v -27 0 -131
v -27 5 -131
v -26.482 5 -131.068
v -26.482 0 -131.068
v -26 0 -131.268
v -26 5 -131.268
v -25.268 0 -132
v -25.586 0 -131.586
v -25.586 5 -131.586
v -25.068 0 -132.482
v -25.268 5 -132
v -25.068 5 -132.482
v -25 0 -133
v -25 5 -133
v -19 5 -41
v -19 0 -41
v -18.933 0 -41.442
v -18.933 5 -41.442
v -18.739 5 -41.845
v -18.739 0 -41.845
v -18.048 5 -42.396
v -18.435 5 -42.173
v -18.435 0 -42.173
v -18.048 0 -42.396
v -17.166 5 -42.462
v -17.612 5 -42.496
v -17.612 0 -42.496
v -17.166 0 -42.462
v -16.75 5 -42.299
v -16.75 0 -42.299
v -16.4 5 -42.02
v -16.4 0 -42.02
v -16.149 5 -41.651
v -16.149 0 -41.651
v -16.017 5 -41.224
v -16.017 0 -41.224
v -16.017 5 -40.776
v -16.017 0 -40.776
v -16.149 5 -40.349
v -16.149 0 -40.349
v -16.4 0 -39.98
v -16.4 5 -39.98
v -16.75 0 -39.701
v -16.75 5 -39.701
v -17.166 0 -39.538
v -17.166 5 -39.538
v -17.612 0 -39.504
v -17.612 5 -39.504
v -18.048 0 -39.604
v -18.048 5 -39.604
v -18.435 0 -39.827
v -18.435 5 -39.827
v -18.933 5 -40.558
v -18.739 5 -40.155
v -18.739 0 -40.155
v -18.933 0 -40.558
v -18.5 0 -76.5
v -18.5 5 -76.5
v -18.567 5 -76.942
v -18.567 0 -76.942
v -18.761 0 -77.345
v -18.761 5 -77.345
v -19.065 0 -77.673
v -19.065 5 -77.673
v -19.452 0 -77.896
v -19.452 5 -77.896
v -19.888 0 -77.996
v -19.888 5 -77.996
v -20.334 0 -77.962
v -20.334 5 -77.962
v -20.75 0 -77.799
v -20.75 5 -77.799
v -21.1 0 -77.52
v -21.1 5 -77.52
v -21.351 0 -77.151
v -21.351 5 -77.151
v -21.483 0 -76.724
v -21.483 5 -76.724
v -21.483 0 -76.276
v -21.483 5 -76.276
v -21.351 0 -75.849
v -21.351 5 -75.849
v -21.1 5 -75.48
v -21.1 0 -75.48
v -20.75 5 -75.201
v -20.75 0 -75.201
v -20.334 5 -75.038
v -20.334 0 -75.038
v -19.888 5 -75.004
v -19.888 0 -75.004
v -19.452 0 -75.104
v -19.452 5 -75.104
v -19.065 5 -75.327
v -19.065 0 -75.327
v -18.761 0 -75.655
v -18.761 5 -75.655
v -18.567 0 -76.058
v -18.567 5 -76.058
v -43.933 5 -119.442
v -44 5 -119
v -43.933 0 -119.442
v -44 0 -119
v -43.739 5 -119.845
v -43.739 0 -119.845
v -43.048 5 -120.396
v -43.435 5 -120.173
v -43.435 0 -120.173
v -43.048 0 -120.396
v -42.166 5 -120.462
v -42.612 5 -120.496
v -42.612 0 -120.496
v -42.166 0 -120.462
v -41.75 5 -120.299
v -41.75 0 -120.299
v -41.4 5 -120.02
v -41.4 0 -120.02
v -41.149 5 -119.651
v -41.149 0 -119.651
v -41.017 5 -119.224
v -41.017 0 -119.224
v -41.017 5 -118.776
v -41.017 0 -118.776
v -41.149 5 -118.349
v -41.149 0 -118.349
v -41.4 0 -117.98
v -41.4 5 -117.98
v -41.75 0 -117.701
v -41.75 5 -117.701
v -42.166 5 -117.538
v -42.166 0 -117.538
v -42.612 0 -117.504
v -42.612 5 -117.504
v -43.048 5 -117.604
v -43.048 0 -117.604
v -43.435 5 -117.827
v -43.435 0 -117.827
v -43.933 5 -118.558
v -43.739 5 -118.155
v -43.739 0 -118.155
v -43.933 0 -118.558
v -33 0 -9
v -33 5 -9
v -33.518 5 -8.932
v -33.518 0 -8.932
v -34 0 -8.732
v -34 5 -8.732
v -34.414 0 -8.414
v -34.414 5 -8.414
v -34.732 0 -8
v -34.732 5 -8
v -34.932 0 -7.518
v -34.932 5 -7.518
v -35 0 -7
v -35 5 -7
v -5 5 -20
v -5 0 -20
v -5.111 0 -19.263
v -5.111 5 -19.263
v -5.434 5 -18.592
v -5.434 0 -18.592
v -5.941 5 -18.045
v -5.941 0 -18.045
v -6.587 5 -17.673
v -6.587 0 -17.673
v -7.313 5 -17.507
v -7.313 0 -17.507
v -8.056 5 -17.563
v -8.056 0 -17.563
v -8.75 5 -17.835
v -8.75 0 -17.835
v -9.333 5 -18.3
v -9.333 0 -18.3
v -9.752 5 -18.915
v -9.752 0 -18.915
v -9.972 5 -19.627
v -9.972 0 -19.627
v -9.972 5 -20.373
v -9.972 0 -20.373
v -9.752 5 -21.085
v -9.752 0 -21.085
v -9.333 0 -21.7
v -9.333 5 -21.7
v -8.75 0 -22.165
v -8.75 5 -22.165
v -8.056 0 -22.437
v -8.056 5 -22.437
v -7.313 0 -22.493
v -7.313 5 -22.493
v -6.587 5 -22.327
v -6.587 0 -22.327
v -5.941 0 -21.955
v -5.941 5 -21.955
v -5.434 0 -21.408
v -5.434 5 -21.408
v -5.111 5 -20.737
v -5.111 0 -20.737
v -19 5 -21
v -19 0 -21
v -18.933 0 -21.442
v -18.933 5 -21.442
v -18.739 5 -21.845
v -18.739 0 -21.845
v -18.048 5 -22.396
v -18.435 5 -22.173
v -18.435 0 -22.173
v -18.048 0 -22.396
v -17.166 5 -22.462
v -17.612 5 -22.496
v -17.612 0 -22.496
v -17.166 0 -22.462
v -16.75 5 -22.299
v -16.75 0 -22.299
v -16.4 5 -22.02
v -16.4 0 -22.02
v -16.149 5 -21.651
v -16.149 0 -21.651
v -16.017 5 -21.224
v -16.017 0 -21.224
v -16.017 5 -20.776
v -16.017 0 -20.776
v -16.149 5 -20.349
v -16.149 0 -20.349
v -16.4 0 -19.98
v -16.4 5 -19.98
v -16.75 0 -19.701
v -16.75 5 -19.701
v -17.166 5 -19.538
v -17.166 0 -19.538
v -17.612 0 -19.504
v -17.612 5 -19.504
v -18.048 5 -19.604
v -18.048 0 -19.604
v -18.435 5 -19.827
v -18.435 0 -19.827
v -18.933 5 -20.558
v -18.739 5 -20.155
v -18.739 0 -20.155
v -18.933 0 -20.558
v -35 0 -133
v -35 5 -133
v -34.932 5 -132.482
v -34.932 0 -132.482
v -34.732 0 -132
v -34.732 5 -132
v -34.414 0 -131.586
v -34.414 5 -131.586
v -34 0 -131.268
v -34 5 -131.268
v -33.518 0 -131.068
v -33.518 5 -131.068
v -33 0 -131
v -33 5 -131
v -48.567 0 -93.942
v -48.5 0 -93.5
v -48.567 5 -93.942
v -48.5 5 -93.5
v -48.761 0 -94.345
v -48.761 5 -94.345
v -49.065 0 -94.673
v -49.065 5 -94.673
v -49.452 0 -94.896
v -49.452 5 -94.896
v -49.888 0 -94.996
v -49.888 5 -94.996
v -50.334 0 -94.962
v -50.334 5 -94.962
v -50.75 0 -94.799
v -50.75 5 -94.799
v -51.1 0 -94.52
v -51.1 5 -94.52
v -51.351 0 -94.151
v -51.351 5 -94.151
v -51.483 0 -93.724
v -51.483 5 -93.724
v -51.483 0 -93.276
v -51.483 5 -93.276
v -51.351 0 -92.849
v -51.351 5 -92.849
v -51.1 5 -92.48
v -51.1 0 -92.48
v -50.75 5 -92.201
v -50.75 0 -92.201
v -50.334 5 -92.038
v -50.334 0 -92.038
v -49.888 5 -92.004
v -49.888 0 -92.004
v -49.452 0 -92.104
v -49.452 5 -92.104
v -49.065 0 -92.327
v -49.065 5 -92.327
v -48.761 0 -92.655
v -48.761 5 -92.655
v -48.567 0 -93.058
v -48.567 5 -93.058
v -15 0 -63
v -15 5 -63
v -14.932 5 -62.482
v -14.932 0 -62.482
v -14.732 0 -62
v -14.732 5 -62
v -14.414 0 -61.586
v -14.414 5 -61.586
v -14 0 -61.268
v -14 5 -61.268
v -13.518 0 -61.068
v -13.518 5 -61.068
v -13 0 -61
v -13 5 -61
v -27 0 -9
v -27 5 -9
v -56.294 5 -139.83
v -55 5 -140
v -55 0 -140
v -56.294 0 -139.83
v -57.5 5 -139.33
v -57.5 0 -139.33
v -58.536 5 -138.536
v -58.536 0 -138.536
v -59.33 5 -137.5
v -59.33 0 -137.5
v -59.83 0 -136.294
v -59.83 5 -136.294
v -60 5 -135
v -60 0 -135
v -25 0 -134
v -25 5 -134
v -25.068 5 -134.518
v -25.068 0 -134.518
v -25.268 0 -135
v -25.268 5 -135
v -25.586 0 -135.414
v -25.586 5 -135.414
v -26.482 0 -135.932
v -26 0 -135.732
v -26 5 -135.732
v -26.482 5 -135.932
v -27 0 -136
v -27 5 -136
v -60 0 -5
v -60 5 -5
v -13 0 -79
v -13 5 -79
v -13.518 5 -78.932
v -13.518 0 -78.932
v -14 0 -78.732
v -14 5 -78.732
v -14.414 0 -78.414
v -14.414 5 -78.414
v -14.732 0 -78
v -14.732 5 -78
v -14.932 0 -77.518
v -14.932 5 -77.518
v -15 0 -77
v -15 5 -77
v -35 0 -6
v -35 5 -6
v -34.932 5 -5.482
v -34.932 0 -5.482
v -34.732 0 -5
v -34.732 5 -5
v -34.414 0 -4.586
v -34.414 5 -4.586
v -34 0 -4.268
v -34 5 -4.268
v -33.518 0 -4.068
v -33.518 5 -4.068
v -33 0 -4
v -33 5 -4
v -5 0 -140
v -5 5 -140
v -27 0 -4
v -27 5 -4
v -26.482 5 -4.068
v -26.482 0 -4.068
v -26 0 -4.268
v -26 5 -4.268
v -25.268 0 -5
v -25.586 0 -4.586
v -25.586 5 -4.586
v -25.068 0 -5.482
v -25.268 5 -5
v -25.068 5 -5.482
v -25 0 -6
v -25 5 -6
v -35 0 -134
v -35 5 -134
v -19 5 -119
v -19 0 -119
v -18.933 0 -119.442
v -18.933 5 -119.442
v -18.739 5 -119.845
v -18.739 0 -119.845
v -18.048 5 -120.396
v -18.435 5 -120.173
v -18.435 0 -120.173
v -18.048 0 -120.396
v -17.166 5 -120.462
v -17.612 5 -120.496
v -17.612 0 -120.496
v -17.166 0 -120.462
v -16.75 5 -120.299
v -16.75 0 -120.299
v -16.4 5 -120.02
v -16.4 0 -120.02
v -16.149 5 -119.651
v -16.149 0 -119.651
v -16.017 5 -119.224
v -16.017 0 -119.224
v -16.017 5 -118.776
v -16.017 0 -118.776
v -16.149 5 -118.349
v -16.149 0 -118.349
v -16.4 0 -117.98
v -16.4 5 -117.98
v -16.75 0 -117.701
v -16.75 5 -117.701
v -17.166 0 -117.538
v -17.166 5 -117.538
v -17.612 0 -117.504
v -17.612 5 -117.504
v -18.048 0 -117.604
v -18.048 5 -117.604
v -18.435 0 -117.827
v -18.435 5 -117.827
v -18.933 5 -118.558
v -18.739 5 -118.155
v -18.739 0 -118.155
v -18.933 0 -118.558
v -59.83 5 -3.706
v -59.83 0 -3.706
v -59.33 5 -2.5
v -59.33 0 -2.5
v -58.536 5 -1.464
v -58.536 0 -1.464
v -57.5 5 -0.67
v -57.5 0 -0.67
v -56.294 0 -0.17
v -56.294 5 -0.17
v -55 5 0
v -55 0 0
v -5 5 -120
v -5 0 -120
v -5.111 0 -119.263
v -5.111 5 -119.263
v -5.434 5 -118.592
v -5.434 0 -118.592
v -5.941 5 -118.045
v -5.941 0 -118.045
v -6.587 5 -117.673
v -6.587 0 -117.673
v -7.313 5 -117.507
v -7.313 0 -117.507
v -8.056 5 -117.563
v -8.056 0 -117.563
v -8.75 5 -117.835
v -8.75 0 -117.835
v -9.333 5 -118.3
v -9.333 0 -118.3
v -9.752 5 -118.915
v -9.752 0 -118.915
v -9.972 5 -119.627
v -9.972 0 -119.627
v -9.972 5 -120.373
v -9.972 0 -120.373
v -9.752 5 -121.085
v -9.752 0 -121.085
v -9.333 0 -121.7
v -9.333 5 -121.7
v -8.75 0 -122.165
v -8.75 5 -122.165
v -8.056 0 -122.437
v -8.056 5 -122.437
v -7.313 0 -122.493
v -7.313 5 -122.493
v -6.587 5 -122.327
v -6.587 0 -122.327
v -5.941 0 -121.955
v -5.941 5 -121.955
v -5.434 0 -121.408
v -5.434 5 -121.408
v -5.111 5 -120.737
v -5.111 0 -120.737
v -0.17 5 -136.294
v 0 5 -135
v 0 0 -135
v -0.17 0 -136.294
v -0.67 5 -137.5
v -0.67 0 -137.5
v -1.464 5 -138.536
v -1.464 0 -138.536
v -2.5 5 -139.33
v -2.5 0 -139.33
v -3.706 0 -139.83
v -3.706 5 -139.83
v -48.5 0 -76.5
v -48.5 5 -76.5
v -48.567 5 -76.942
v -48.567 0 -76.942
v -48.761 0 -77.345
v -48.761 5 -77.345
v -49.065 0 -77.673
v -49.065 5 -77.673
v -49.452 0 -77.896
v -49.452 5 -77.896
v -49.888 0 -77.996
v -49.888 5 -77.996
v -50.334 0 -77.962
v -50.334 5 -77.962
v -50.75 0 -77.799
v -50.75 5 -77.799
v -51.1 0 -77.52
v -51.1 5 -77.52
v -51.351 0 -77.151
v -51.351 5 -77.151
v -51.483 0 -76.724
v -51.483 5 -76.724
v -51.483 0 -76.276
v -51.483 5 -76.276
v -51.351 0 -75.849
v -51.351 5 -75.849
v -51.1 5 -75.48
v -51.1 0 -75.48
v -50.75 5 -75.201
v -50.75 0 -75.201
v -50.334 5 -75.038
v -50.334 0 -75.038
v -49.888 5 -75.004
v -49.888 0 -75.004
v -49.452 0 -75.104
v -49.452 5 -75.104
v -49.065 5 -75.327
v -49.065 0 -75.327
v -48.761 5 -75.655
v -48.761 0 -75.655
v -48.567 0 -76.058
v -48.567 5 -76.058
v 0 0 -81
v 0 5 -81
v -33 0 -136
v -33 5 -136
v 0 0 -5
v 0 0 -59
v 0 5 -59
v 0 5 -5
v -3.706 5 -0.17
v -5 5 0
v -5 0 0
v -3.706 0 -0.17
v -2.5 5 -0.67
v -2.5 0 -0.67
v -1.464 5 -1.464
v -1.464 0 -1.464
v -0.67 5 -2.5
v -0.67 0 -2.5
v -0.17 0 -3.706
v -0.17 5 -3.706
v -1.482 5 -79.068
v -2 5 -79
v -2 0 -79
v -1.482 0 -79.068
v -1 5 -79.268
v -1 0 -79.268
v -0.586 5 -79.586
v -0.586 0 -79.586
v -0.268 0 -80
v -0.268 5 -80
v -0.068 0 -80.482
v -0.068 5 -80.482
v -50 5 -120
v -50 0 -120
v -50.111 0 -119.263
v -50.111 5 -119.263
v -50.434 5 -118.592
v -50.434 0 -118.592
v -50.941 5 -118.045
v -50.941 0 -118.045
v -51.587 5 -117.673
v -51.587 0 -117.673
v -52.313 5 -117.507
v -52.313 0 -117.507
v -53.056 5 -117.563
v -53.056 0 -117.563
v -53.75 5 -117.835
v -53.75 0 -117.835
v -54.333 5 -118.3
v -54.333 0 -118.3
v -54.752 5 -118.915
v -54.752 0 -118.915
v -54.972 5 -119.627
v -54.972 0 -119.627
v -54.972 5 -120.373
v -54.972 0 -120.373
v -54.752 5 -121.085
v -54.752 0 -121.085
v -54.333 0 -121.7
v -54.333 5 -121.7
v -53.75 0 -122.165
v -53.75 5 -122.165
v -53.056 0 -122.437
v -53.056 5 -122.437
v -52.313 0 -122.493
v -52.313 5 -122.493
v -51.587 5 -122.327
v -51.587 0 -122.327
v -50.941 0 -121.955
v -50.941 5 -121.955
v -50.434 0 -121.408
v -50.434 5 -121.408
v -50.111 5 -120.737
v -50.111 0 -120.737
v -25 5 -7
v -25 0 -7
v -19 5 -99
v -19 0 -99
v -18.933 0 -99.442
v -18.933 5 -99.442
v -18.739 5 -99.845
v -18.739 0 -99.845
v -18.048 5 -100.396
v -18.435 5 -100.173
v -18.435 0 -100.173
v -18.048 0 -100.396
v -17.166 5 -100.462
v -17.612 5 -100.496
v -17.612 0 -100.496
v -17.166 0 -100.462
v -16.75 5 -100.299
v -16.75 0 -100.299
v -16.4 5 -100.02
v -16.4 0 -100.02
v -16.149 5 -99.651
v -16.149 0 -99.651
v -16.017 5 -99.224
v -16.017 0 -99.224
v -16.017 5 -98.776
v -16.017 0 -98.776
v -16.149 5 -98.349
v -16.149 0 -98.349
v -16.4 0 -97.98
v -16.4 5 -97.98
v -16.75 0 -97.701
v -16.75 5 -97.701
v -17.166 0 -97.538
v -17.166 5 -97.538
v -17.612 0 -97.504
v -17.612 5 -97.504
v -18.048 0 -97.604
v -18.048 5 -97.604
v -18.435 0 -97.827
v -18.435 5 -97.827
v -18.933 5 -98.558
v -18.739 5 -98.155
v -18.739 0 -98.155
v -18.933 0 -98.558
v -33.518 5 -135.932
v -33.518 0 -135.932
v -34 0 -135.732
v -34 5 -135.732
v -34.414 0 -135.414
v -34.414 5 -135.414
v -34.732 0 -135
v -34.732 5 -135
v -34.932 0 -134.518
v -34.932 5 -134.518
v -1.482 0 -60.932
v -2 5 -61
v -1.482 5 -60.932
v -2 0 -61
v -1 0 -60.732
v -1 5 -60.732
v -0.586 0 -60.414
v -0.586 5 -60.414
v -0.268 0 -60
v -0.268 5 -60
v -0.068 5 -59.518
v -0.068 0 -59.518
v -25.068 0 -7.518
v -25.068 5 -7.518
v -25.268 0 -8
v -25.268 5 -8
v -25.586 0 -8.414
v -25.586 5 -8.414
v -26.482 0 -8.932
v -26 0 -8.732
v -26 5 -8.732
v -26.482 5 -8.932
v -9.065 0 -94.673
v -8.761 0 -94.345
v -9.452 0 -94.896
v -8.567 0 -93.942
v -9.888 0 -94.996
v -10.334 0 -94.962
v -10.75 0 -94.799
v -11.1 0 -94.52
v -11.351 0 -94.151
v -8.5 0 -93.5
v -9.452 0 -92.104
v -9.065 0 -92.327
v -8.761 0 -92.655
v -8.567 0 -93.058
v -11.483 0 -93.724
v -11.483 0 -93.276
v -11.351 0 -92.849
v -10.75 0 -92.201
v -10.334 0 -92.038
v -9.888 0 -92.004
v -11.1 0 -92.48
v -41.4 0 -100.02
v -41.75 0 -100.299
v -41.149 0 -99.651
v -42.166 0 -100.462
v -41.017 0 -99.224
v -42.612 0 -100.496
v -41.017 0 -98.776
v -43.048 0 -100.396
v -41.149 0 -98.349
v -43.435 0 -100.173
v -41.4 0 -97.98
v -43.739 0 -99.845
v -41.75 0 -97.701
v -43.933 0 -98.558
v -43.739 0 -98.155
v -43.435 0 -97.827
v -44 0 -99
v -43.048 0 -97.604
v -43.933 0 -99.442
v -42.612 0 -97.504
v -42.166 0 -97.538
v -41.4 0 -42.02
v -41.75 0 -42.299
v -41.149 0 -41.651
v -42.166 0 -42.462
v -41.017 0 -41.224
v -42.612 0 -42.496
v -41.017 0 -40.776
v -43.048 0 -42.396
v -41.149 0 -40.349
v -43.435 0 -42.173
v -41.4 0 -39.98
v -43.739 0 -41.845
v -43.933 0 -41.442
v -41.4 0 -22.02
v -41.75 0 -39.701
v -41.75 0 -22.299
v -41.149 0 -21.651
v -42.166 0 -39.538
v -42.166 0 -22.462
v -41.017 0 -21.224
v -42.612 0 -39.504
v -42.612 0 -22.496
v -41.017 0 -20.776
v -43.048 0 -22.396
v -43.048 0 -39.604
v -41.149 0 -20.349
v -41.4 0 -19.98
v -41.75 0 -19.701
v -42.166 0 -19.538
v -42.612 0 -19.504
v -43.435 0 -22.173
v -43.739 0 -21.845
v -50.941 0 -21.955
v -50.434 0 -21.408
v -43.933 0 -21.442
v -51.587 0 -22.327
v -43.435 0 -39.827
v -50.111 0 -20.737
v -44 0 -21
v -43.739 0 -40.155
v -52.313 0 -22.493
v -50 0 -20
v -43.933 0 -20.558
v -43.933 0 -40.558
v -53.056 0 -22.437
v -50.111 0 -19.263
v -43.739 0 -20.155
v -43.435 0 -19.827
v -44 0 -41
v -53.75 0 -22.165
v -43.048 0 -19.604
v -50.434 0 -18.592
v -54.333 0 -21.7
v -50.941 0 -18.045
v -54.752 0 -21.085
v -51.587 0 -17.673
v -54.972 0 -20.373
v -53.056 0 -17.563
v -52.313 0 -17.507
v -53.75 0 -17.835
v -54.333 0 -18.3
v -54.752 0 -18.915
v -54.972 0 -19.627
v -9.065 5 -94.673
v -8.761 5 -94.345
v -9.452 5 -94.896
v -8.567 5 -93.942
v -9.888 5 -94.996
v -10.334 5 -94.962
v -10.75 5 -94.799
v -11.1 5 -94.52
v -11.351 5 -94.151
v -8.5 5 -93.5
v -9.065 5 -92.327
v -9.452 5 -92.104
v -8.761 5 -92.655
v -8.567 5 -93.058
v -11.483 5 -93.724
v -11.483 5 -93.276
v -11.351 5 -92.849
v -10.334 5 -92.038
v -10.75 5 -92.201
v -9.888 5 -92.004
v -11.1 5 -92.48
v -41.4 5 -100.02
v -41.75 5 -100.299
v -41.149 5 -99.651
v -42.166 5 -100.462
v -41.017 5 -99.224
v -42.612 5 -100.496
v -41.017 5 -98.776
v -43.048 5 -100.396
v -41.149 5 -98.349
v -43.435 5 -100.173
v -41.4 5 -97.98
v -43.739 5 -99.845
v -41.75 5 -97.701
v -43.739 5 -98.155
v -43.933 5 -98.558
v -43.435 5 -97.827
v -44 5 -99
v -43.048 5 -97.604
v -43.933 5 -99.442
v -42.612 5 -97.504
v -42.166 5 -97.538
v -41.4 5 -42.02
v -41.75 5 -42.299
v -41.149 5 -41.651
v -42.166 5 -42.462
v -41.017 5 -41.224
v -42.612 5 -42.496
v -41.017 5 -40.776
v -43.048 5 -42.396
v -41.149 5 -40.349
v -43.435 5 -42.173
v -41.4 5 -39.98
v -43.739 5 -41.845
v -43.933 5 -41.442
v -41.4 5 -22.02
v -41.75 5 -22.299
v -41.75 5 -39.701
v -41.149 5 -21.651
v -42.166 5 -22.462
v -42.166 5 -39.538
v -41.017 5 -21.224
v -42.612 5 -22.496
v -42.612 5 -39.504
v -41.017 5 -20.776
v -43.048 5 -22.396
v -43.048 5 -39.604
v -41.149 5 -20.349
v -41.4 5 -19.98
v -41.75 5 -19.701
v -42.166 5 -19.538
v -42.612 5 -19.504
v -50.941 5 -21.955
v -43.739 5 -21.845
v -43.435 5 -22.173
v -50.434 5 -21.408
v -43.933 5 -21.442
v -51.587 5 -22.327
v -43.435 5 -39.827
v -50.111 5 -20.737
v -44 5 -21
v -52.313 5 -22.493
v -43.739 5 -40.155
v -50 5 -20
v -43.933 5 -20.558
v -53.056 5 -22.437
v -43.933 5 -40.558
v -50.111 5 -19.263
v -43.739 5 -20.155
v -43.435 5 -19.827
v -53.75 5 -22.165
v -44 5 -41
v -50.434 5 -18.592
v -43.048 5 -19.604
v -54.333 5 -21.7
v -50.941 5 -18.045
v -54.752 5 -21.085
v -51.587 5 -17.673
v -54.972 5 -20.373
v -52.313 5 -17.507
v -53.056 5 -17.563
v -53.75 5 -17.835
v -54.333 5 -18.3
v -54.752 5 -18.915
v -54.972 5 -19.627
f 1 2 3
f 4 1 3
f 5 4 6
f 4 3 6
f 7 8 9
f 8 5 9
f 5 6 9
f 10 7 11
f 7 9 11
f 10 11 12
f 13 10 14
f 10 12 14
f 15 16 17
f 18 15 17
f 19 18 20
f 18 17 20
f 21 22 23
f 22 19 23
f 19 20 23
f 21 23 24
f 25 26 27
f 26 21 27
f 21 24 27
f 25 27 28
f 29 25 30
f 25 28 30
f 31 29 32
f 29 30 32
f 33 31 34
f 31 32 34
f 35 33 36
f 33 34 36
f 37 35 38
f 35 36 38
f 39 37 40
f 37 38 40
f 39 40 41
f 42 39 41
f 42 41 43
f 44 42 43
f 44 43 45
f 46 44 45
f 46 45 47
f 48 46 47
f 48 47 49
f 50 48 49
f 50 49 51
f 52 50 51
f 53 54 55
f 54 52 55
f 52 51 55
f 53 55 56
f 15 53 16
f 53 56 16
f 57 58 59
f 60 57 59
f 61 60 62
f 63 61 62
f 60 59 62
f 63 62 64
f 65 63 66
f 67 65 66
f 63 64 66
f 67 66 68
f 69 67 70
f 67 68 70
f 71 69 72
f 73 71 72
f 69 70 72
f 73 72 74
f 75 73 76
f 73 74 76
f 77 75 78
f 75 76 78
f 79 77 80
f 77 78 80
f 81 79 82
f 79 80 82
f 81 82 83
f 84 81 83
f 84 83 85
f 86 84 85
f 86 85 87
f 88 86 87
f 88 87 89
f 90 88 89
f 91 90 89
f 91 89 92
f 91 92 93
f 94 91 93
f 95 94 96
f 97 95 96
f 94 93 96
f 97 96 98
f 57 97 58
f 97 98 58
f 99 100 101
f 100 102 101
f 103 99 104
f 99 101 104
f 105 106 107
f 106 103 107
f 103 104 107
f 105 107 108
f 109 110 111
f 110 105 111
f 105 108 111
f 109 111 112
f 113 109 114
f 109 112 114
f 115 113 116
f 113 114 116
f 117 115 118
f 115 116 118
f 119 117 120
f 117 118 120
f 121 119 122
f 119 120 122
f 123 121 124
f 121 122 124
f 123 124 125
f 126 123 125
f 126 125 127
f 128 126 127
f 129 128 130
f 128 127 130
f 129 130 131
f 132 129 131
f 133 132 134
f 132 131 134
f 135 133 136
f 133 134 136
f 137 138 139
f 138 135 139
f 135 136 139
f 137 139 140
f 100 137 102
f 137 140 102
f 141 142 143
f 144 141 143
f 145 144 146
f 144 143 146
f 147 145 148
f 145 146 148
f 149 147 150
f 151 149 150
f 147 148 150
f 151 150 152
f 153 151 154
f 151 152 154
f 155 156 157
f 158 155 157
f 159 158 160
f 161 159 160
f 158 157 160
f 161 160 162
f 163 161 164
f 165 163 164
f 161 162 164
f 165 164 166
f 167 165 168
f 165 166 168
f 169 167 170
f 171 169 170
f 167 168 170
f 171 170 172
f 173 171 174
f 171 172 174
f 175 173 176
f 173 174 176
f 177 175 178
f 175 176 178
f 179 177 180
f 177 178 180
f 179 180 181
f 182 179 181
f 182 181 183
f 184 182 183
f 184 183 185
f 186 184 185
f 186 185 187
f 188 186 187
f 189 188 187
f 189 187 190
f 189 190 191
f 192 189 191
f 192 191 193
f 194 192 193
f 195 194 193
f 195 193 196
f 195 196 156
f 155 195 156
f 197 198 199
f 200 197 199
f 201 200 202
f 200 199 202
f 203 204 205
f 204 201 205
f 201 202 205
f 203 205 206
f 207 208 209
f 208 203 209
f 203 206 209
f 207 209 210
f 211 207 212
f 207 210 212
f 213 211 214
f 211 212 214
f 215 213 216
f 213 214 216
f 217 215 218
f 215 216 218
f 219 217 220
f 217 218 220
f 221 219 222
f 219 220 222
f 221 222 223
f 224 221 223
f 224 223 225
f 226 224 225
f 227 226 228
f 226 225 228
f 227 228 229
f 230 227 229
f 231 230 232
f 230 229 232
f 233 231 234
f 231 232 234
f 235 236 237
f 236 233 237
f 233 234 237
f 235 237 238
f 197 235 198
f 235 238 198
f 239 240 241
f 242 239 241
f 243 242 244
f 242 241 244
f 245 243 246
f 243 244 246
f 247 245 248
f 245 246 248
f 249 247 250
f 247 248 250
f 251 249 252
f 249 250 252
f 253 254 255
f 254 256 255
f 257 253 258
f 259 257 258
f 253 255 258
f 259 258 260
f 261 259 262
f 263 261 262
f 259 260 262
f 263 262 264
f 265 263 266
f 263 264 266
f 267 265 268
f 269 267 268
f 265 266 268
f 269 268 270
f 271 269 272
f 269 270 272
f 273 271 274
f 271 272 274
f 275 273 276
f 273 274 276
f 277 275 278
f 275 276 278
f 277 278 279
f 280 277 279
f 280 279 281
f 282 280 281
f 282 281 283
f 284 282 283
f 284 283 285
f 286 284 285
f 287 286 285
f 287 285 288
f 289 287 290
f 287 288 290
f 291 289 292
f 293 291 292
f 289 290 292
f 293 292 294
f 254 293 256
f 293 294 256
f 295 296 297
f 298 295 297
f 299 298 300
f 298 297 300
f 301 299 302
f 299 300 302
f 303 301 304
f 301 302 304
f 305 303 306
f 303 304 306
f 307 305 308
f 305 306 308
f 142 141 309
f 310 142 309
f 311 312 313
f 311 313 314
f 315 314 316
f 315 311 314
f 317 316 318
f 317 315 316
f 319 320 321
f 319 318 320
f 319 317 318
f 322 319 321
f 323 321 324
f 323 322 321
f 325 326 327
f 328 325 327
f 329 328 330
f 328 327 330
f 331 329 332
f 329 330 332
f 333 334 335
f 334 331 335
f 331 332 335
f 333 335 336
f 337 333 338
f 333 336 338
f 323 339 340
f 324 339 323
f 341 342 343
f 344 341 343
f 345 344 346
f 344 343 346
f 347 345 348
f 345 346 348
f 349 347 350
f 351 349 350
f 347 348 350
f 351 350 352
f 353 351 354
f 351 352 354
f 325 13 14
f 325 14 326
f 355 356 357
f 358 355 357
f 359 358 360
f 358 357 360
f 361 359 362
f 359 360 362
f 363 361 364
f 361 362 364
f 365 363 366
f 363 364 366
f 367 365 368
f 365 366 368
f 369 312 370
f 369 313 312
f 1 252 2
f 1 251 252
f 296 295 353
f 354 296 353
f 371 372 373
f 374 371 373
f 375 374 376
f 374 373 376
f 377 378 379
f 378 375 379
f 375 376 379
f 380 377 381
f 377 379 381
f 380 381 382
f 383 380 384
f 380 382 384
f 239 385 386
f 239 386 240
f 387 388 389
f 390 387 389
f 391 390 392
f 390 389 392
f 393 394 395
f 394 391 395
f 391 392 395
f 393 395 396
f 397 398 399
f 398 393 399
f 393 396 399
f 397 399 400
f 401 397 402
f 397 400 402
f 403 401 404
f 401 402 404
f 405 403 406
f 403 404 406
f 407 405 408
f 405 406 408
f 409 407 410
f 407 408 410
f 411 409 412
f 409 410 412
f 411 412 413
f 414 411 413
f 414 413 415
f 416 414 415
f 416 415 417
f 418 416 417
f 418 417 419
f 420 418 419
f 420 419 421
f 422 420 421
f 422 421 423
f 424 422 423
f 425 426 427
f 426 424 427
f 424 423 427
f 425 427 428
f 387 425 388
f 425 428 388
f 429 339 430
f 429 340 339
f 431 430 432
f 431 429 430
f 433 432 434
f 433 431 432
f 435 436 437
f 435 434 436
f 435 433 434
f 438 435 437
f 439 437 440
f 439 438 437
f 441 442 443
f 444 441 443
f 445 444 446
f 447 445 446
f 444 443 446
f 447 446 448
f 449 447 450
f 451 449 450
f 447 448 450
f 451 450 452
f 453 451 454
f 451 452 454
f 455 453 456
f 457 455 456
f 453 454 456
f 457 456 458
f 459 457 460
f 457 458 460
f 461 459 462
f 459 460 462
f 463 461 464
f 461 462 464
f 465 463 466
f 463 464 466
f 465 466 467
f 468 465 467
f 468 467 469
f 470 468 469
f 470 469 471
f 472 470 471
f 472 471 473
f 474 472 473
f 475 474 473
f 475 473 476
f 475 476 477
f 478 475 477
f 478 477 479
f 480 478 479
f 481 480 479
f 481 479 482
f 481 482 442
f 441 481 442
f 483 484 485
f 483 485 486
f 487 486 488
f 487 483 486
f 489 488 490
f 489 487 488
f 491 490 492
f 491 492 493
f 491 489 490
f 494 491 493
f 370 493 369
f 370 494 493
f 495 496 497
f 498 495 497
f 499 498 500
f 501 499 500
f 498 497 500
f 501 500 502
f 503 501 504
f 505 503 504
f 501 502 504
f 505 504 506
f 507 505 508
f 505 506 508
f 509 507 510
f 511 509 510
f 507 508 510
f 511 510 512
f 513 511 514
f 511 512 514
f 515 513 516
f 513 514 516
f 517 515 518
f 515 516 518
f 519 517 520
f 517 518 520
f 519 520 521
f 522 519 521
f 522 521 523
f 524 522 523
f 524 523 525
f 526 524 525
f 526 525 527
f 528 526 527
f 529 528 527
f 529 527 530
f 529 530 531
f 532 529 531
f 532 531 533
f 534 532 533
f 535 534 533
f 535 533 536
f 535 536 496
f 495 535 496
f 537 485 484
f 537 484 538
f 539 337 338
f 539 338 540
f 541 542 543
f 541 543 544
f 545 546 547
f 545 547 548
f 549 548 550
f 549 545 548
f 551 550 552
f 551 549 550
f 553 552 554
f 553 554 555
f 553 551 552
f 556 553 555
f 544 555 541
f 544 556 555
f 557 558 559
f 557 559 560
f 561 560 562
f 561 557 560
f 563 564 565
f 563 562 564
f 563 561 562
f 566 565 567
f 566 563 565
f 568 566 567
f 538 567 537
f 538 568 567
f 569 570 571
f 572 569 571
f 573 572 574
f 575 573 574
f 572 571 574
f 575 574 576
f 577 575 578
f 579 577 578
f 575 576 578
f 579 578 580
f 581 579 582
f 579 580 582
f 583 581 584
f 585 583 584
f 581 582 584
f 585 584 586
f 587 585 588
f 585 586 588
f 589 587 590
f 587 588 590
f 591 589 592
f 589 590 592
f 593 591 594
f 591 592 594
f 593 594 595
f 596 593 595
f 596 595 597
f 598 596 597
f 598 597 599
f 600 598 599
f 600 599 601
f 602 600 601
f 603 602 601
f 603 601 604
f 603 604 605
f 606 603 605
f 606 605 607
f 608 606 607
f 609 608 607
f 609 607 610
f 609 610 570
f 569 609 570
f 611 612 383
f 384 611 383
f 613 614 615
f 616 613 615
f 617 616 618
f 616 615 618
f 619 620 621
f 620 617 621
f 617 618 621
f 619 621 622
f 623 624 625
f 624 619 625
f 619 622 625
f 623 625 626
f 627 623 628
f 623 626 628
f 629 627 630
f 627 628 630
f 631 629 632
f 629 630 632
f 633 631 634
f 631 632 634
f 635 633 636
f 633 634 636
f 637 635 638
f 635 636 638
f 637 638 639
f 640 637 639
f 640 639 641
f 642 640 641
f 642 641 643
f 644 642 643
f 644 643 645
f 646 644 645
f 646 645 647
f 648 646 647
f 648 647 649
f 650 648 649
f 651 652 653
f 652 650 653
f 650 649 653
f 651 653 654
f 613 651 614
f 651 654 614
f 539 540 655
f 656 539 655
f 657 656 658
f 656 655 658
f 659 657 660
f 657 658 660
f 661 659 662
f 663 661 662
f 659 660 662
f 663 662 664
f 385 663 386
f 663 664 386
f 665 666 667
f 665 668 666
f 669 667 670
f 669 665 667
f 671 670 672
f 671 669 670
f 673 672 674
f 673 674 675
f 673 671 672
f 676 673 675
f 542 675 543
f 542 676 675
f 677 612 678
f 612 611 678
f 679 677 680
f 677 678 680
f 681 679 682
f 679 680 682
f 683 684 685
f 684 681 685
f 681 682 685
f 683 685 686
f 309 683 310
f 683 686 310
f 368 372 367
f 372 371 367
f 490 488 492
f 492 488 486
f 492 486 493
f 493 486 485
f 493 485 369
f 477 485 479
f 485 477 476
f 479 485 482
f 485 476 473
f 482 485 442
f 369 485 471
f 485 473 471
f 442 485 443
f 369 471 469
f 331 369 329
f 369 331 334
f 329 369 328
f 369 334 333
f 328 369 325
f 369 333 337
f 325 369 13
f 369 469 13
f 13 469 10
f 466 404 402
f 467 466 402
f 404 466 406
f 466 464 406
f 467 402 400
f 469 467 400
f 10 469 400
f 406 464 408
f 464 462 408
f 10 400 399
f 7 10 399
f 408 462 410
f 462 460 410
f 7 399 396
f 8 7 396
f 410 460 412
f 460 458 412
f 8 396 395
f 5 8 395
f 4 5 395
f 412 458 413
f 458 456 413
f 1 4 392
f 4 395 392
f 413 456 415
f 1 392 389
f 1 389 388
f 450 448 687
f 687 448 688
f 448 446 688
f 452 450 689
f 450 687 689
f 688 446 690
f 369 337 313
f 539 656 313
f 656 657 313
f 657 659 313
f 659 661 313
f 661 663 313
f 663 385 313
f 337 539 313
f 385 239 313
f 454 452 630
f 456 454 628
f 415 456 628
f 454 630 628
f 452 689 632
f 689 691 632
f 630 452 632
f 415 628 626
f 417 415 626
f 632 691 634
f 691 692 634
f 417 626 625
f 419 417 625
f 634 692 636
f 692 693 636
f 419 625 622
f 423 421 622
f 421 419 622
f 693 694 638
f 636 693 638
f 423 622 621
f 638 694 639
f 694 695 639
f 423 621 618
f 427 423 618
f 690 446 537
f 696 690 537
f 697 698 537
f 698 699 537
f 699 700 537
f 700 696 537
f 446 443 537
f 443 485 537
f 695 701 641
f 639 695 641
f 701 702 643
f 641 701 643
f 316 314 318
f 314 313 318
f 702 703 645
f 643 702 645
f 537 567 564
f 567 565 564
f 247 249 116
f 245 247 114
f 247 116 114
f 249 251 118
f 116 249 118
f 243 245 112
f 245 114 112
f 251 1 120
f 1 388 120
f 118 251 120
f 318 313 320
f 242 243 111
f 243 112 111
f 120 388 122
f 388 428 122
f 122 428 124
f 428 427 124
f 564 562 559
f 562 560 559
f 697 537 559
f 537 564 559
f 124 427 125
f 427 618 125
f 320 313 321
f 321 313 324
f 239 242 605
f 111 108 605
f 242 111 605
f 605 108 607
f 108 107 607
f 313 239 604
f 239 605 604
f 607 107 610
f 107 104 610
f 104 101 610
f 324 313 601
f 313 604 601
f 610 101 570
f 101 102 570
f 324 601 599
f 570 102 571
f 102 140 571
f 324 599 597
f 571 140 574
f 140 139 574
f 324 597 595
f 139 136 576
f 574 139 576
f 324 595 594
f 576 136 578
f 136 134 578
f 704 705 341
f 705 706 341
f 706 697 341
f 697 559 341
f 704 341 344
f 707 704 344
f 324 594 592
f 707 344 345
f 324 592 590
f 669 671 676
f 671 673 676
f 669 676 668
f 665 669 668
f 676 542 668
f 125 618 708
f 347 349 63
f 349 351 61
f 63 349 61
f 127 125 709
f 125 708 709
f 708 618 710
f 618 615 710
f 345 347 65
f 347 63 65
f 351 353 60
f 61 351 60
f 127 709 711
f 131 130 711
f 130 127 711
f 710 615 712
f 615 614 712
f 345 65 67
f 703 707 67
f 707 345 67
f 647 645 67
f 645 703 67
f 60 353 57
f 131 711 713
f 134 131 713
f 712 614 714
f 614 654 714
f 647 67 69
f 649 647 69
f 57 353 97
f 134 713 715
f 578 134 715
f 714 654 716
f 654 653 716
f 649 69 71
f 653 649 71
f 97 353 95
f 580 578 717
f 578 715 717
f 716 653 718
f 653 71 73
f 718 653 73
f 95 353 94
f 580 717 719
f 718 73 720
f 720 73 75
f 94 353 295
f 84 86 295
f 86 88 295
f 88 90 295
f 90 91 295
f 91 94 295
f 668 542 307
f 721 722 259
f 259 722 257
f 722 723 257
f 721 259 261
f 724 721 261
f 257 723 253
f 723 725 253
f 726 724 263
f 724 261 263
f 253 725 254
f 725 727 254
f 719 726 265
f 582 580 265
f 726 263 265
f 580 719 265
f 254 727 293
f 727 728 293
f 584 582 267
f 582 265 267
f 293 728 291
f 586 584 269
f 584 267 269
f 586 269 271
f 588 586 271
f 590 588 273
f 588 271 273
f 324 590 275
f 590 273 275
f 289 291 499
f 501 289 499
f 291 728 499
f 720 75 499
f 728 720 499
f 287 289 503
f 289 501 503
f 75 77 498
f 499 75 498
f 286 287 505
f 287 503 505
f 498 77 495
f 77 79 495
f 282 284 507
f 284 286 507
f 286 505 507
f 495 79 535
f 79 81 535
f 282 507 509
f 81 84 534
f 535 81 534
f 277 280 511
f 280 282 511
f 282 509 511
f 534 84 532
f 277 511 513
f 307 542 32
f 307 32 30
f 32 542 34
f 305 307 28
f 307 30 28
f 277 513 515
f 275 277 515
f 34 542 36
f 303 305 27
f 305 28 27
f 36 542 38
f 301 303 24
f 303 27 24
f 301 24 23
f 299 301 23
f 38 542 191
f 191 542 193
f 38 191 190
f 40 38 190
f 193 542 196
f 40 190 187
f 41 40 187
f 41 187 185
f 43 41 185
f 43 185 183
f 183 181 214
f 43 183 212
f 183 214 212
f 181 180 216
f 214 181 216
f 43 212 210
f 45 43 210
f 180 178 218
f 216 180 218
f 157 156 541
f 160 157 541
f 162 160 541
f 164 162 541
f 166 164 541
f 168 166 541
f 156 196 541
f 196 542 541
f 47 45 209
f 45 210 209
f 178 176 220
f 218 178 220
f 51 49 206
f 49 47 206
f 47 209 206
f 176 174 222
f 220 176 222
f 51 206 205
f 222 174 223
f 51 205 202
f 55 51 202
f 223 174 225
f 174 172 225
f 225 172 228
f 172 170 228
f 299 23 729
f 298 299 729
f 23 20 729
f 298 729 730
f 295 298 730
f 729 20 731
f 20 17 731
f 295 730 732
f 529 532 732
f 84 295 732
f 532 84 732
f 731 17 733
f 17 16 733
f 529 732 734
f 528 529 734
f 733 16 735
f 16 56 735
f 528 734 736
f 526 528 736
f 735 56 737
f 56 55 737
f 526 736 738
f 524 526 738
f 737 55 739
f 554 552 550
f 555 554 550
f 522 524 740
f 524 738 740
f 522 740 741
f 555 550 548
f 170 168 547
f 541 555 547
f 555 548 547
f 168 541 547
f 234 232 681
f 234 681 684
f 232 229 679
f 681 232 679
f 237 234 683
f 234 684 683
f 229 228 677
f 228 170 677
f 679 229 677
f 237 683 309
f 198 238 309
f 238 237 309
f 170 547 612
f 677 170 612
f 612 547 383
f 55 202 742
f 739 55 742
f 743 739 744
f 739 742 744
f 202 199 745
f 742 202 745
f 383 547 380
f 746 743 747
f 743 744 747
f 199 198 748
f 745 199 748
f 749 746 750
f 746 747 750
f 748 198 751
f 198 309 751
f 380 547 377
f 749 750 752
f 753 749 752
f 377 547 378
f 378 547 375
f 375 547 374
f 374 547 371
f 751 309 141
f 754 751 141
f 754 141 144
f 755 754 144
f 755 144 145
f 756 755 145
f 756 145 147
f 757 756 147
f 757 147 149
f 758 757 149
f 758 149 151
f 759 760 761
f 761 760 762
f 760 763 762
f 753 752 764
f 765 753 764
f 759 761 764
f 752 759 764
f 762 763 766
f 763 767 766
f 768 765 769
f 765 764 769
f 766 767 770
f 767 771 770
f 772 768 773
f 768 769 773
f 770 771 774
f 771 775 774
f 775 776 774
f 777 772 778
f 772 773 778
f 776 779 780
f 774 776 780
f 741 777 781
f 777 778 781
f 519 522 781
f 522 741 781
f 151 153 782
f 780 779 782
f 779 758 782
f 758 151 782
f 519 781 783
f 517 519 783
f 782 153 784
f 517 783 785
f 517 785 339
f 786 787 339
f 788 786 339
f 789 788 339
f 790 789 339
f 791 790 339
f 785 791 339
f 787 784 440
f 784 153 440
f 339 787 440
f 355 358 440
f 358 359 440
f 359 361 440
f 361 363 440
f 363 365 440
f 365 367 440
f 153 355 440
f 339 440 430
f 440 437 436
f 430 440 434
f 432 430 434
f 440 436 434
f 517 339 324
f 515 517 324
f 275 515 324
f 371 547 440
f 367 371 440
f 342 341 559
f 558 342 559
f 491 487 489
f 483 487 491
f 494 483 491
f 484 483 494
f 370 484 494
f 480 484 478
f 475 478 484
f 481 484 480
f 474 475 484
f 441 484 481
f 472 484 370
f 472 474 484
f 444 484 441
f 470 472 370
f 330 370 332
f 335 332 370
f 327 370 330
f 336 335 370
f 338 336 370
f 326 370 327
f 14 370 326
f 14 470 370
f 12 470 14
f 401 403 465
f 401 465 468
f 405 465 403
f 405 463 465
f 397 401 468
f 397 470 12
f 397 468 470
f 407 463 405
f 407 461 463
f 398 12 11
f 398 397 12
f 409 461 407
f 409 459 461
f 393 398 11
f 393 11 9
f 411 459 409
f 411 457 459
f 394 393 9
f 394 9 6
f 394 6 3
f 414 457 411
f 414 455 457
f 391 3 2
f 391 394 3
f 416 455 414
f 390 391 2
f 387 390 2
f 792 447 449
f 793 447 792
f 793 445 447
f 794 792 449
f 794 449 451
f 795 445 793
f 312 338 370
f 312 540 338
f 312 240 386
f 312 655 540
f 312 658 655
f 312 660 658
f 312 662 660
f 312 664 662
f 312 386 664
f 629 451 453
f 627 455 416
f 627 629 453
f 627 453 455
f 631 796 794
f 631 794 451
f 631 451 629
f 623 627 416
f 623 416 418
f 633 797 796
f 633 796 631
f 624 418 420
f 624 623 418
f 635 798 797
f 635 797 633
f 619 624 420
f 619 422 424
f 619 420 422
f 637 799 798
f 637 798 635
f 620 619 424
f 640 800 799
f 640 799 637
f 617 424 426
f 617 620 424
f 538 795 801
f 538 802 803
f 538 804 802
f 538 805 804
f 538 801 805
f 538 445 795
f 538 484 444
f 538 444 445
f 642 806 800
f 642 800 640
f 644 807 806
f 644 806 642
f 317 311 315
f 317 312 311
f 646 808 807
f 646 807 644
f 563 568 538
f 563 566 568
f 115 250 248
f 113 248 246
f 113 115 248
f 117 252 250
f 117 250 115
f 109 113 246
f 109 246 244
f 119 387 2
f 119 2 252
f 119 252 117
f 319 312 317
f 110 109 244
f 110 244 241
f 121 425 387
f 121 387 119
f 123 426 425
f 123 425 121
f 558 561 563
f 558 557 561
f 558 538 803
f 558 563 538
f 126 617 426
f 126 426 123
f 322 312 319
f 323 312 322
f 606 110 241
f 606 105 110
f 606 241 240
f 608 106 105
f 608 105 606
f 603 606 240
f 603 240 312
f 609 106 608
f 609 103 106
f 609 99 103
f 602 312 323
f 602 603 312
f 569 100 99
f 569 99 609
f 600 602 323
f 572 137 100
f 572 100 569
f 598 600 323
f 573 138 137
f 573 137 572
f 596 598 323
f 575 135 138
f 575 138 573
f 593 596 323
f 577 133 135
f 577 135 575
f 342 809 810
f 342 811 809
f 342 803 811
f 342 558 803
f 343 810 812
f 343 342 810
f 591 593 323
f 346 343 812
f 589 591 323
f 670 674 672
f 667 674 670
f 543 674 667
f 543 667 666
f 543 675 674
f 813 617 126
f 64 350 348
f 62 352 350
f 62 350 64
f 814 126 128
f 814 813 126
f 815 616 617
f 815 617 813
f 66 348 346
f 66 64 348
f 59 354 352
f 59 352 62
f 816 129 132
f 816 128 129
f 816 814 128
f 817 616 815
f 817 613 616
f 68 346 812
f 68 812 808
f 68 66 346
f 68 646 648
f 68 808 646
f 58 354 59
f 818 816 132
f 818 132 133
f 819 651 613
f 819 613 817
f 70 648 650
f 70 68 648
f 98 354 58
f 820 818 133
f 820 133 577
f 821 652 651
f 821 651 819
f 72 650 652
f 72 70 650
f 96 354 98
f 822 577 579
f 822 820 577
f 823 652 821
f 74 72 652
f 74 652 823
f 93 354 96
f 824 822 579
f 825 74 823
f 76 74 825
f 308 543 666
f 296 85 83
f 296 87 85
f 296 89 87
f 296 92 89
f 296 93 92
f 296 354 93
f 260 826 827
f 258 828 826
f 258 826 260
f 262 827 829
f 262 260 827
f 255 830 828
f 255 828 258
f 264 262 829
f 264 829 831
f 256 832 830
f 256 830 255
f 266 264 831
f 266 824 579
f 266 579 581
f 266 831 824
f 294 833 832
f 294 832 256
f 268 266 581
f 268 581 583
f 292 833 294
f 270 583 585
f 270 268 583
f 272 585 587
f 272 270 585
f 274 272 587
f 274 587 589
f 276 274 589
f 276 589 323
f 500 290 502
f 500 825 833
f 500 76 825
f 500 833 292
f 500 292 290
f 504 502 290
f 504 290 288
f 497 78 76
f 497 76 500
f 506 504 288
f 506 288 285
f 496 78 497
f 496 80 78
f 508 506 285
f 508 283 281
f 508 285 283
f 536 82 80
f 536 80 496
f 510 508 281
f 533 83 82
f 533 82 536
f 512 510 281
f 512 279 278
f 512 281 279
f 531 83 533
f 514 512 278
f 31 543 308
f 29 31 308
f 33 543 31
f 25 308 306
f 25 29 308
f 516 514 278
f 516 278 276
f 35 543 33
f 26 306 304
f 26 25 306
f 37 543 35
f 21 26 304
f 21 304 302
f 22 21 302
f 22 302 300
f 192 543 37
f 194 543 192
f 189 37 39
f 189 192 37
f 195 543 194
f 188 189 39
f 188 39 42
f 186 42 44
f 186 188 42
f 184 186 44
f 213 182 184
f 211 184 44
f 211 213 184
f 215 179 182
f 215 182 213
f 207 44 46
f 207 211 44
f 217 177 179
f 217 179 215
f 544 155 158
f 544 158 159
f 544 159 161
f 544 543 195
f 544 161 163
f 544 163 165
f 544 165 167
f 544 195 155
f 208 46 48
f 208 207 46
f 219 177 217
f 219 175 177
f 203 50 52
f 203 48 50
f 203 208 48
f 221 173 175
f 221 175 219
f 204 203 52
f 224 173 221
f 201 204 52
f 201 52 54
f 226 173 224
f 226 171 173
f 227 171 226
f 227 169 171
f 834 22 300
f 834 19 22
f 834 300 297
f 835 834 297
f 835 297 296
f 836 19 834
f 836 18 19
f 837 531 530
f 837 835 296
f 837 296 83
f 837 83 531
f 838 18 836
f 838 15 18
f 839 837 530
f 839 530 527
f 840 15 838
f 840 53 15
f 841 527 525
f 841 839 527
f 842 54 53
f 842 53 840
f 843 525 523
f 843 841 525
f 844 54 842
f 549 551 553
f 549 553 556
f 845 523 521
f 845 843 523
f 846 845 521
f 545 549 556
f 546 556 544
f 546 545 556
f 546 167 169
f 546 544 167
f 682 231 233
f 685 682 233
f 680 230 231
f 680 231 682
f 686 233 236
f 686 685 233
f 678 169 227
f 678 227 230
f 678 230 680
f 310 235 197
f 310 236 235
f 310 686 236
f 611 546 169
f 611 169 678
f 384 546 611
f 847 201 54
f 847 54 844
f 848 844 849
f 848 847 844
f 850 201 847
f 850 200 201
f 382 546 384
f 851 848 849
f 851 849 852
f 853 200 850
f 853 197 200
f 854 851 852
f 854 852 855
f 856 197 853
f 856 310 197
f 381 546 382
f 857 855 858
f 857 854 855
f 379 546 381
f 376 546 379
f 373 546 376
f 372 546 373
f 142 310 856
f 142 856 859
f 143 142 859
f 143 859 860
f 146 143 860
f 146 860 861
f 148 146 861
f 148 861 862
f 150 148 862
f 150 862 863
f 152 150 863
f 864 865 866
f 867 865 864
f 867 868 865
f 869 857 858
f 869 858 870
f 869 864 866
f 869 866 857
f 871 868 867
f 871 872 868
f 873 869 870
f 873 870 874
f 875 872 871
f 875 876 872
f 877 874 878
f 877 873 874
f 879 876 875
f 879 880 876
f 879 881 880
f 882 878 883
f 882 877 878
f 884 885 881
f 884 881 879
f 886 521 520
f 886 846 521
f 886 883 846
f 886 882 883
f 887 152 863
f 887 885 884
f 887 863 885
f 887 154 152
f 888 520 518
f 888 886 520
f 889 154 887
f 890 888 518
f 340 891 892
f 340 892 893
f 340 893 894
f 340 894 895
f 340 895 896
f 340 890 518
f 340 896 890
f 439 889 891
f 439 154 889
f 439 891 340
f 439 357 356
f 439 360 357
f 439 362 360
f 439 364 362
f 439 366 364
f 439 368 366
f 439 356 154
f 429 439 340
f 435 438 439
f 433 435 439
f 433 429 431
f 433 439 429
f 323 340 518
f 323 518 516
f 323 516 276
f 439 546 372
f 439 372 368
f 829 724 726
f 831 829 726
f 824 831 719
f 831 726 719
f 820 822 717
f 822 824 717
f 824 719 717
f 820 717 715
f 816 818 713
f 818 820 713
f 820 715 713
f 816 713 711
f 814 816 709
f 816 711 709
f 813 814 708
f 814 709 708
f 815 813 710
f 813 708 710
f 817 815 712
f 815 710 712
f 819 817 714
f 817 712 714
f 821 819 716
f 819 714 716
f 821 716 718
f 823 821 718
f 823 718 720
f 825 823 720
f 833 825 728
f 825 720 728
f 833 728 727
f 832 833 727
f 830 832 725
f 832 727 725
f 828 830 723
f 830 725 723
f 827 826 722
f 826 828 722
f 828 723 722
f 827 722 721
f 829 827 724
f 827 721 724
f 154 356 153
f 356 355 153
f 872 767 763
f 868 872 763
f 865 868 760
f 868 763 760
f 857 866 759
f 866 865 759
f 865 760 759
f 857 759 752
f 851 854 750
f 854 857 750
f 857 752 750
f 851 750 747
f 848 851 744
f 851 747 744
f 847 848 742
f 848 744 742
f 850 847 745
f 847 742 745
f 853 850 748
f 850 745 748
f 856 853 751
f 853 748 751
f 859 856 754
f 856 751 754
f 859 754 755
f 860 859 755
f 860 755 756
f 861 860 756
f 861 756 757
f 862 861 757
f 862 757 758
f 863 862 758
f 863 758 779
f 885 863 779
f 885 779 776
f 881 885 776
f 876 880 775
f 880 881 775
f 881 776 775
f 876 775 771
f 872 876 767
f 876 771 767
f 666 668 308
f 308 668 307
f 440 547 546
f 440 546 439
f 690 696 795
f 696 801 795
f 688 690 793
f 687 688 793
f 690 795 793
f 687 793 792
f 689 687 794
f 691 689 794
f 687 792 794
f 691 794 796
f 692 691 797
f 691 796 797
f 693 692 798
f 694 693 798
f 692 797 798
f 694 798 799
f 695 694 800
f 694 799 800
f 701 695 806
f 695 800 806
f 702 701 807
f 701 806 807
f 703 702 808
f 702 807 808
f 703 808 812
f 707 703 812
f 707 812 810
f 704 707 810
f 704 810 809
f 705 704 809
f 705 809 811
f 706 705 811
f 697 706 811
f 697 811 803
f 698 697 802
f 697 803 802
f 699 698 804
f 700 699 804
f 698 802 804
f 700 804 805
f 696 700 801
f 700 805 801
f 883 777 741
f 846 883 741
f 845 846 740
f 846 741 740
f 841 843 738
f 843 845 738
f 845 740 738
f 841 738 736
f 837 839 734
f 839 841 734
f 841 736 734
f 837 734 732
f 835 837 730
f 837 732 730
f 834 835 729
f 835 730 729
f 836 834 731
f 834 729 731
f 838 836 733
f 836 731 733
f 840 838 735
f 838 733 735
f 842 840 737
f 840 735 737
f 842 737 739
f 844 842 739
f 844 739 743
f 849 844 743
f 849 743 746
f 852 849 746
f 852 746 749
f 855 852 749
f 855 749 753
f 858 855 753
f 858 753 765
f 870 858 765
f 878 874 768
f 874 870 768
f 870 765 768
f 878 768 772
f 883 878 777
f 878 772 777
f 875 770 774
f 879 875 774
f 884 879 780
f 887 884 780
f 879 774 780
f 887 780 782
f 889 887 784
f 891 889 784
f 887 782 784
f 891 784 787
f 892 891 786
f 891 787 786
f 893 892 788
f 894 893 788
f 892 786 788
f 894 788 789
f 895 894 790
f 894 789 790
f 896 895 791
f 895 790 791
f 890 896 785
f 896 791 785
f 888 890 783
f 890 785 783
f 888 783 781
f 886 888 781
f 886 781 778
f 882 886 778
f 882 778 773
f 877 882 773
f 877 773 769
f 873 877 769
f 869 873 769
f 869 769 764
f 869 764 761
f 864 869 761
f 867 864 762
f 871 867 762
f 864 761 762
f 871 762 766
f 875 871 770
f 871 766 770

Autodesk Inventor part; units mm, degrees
ref_plane "YZ Plane" through (0, 0, 0) normal (1, 0, 0) x (0, 1, 0)
ref_plane "XZ Plane" through (0, 0, 0) normal (0, 1, 0) x (-1, 0, 0)
ref_plane "XY Plane" through (0, 0, 0) normal (0, 0, 1) x (1, 0, 0)
sketch "Sketch1" plane through (0, 0, 0) normal (0, 1, 0) x (-1, 0, 0)
  line L0 (0, 0) -> (60, 0)
  line L1 (60, 0) -> (60, -140)
  line L2 (60, -140) -> (0, -140)
  line L3 (0, -140) -> (0, 0)
  line L4 (30, -20.8594) -> (30, -183.1932) construction
  line L5 (42.5, -21.7206) -> (42.5, -191.0157) construction
  line L6 (17.5, -21.7206) -> (17.5, -184.1979) construction
  circle A0 centre (42.5, -21) radius 1.5
  circle A1 centre (42.5, -41) radius 1.5
  circle A2 centre (42.5, -99) radius 1.5
  circle A3 centre (42.5, -119) radius 1.5
  circle A4 centre (17.5, -99) radius 1.5
  circle A5 centre (17.5, -119) radius 1.5
  circle A6 centre (17.5, -41) radius 1.5
  circle A7 centre (17.5, -21) radius 1.5
  dimension "d0" = 140
  dimension "d1" = 60
  dimension "d2" = 30
  dimension "d3" = 12.5
  dimension "d4" = 12.5
  dimension "d5" = 3
  dimension "d6" = 3
  dimension "d7" = 3
  dimension "d8" = 3
  dimension "d9" = 3
  dimension "d10" = 3
  dimension "d11" = 3
  dimension "d12" = 3
  dimension "d13" = 20
  dimension "d14" = 20
  dimension "d15" = 20
  dimension "d16" = 20
  dimension "d17" = 21
  dimension "d18" = 21
  dimension "d19" = 21
  dimension "d20" = 21
extrude "Extrusion1" add sketch "Sketch1" along normal blind 5
sketch "Sketch2" plane through (0, 0, 0) normal (0, -1, 0) x (1, 0, 0)
  circle A0 centre (-7.5, -20) radius 2.5
  circle A1 centre (-7.5, -120) radius 2.5
  circle A2 centre (-52.5, -20) radius 2.5
  circle A3 centre (-52.5, -120) radius 2.5
  line L0 (-60, 0) -> (0, 0) projected
  line L1 (0, 0) -> (0, -140) projected
  line L2 (-60, -140) -> (-60, 0) projected
  line L3 (0, -140) -> (-60, -140) projected
  dimension "d23" = 5
  dimension "d24" = 5
  dimension "d25" = 5
  dimension "d26" = 5
  dimension "d27" = 20
  dimension "d28" = 7.5
  dimension "d29" = 20
  dimension "d30" = 7.5
  dimension "d31" = 20
  dimension "d32" = 7.5
  dimension "d33" = 20
  dimension "d34" = 7.5
extrude "Extrusion2" cut sketch "Sketch2" against normal blind 10 contours A0 | A1 | A2 | A3
sketch "Sketch3" plane through (0, 0, 0) normal (0, -1, 0) x (1, 0, 0)
  line L0 (-25, -4) -> (-35, -4)
  line L1 (-35, -4) -> (-35, -9)
  line L2 (-35, -9) -> (-25, -9)
  line L3 (-25, -9) -> (-25, -4)
  line L4 (9.3646, -70) -> (-76.8402, -70) construction
  line L5 (-60, 0) -> (0, 0) projected
  line L6 (0, 0) -> (0, -140) projected
  line L7 (-25, -136) -> (-35, -136)
  line L8 (-35, -136) -> (-35, -131)
  line L9 (-35, -131) -> (-25, -131)
  line L10 (-25, -131) -> (-25, -136)
  dimension "d40" = 70
  dimension "d41" = 10
  dimension "d42" = 4
  dimension "d43" = 5
  dimension "d44" = 25
extrude "Extrusion3" cut sketch "Sketch3" against normal blind 10
fillet "Fillet2" radius 5 4 edges at (-60, 2.5, 0) (-60, 2.5, -140) (0, 2.5, -140) (0, 2.5, 0)
sketch "Sketch4" plane through (0, 5, 0) normal (0, 1, 0) x (1, 0, 0)
  circle A0 centre (-50, 76.5) radius 1.5
  circle A1 centre (-50, 93.5) radius 1.5
  circle A2 centre (-20, 76.5) radius 1.5
  circle A3 centre (-10, 93.5) radius 1.5
  line L0 (-5, 140) -> (-55, 140) projected
  line L1 (-60, 135) -> (-60, 5) projected
  line L2 (0, 5) -> (0, 135) projected
  point P0 (0, 0)
  dimension "d49" = 3
  dimension "d50" = 3
  dimension "d51" = 3
  dimension "d52" = 3
  dimension "d53" = 46.5
  dimension "d54" = 46.5
  dimension "d55" = 63.5
  dimension "d56" = 63.5
  dimension "d57" = 10
  dimension "d59" = 10
  dimension "d71" = 10
  dimension "d72" = 20
extrude "Extrusion4" cut sketch "Sketch4" against normal blind 10
sketch "Sketch5" plane through (0, 0, 0) normal (0, -1, 0) x (1, 0, 0)
  line L0 (59.7124, -61) -> (87.7124, -61) projected
  line L1 (87.7124, -79) -> (59.7124, -79) projected
  line L2 (5, -61) -> (-15, -61)
  line L3 (-15, -61) -> (-15, -79)
  line L4 (-15, -79) -> (5, -79)
  line L5 (5, -79) -> (5, -61)
  line L6 (0, -5) -> (0, -135) projected
  point P0 (0, 0)
  dimension "d66" = 15
  dimension "d67" = 5
extrude "Extrusion5" cut sketch "Sketch5" against normal blind 10
fillet "Fillet3" radius 2 4 edges at (0, 2.5, -79) (0, 2.5, -61) (-15, 2.5, -79) (-15, 2.5, -61)
fillet "Fillet4" radius 2 8 edges at (-25, 2.5, -9) (-25, 2.5, -4) (-35, 2.5, -4) (-35, 2.5, -9) (-35, 2.5, -136) (-35, 2.5, -131) (-25, 2.5, -131) (-25, 2.5, -136)
equation "\"d2\" = 0.5 * d1"
equation "\"d4\" = d3"
equation "\"d6\" = d5"
equation "\"d7\" = d5"
equation "\"d8\" = d5"
equation "\"d9\" = d5"
equation "\"d10\" = d5"
equation "\"d11\" = d5"
equation "\"d12\" = d5"
equation "\"d14\" = d13"
equation "\"d15\" = d13"
equation "\"d16\" = d13"
equation "\"d18\" = d17"
equation "\"d19\" = d17"
equation "\"d20\" = d17"
equation "\"d29\" = d27"
equation "\"d30\" = d28"
equation "\"d31\" = d27"
equation "\"d32\" = d28"
equation "\"d33\" = d27"
equation "\"d34\" = d28"
equation "\"d50\" = d49"
equation "\"d51\" = d49"
equation "\"d52\" = d49"
properties part number "Y-Axis_front_plate_bottom"
